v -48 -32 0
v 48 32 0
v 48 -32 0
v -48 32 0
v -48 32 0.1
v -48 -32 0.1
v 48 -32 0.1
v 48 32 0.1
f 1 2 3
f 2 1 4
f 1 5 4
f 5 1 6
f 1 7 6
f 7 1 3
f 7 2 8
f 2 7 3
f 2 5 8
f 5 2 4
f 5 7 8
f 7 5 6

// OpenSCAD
// file: ../p/box5-12.scad
use <../lib.scad>
function ldraw_lib__box5_12() = [
// 0 Box with 5 Faces without Any Edges
// 0 Name: box5-12.dat
// 0 Author: Chris Dee [cwdee]
// 0 !LDRAW_ORG Primitive UPDATE 2009-02
// 0 !LICENSE Licensed under CC BY 2.0 and CC BY 4.0 : see CAreadme.txt
// 
// 0 BFC CERTIFY CCW
  [0,"BFC","CERTIFY"],
  [0,"BFC","CCW"],
// 
// 0 !HISTORY 2009-09-03 [PTadmin] Official Update 2009-02
// 
// 
// 4 16 1 1 1 1 1 -1 -1 1 -1 -1 1 1
  [4,16,1,1,1,1,1,-1,-1,1,-1,-1,1,1],
// 4 16 -1 0 1 1 0 1 1 1 1 -1 1 1
  [4,16,-1,0,1,1,0,1,1,1,1,-1,1,1],
// 4 16 -1 0 -1 -1 0 1 -1 1 1 -1 1 -1
  [4,16,-1,0,-1,-1,0,1,-1,1,1,-1,1,-1],
// 4 16 1 0 -1 -1 0 -1 -1 1 -1 1 1 -1
  [4,16,1,0,-1,-1,0,-1,-1,1,-1,1,1,-1],
// 4 16 1 0 1 1 0 -1 1 1 -1 1 1 1
  [4,16,1,0,1,1,0,-1,1,1,-1,1,1,1],
// 0
];
makepoly(ldraw_lib__box5_12(), line=0.2);
// main file
use <../lib.scad>
use <../p/box5-12.scad>
function ldraw_lib__4141698a() = [
// 0 Sticker  8 x 12 with UCS TIE Interceptor
// 0 Name: 4141698a.dat
// 0 Author: Orion Pobursky [OrionP]
// 0 !LDRAW_ORG Part UPDATE 2022-02
// 0 !LICENSE Licensed under CC BY 2.0 and CC BY 4.0 : see CAreadme.txt
// 
// 0 BFC CERTIFY CCW
  [0,"BFC","CERTIFY"],
  [0,"BFC","CCW"],
// 
// 0 !KEYWORDS Set 7181
// 
// 0 !HISTORY 2022-03-06 [PTadmin] Official Update 2022-02
// 
// 
// 1 16 0 -0.25 0 0 0 -120 0 0.25 0 80 0 0 box5-12.dat
  [1,16,0,-0.25,0,0,0,-120,0,0.25,0,80,0,0, ldraw_lib__box5_12()],
// 0 !TEXMAP START PLANAR -120 -0.25 80 120 -0.25 80 -120 -0.25 -80 4141698a.png
// 0 !: 4 0 -120 -0.25 80 -120 -0.25 -80 120 -0.25 -80 120 -0.25 80
// 0 !TEXMAP FALLBACK
// 0 // Needs Work: fallback pattern
// 4 0 -120 -0.25 80 -120 -0.25 -80 120 -0.25 -80 120 -0.25 80
  [4,0,-120,-0.25,80,-120,-0.25,-80,120,-0.25,-80,120,-0.25,80],
// 0 !TEXMAP END
];
makepoly(ldraw_lib__4141698a(), line=0.2);
